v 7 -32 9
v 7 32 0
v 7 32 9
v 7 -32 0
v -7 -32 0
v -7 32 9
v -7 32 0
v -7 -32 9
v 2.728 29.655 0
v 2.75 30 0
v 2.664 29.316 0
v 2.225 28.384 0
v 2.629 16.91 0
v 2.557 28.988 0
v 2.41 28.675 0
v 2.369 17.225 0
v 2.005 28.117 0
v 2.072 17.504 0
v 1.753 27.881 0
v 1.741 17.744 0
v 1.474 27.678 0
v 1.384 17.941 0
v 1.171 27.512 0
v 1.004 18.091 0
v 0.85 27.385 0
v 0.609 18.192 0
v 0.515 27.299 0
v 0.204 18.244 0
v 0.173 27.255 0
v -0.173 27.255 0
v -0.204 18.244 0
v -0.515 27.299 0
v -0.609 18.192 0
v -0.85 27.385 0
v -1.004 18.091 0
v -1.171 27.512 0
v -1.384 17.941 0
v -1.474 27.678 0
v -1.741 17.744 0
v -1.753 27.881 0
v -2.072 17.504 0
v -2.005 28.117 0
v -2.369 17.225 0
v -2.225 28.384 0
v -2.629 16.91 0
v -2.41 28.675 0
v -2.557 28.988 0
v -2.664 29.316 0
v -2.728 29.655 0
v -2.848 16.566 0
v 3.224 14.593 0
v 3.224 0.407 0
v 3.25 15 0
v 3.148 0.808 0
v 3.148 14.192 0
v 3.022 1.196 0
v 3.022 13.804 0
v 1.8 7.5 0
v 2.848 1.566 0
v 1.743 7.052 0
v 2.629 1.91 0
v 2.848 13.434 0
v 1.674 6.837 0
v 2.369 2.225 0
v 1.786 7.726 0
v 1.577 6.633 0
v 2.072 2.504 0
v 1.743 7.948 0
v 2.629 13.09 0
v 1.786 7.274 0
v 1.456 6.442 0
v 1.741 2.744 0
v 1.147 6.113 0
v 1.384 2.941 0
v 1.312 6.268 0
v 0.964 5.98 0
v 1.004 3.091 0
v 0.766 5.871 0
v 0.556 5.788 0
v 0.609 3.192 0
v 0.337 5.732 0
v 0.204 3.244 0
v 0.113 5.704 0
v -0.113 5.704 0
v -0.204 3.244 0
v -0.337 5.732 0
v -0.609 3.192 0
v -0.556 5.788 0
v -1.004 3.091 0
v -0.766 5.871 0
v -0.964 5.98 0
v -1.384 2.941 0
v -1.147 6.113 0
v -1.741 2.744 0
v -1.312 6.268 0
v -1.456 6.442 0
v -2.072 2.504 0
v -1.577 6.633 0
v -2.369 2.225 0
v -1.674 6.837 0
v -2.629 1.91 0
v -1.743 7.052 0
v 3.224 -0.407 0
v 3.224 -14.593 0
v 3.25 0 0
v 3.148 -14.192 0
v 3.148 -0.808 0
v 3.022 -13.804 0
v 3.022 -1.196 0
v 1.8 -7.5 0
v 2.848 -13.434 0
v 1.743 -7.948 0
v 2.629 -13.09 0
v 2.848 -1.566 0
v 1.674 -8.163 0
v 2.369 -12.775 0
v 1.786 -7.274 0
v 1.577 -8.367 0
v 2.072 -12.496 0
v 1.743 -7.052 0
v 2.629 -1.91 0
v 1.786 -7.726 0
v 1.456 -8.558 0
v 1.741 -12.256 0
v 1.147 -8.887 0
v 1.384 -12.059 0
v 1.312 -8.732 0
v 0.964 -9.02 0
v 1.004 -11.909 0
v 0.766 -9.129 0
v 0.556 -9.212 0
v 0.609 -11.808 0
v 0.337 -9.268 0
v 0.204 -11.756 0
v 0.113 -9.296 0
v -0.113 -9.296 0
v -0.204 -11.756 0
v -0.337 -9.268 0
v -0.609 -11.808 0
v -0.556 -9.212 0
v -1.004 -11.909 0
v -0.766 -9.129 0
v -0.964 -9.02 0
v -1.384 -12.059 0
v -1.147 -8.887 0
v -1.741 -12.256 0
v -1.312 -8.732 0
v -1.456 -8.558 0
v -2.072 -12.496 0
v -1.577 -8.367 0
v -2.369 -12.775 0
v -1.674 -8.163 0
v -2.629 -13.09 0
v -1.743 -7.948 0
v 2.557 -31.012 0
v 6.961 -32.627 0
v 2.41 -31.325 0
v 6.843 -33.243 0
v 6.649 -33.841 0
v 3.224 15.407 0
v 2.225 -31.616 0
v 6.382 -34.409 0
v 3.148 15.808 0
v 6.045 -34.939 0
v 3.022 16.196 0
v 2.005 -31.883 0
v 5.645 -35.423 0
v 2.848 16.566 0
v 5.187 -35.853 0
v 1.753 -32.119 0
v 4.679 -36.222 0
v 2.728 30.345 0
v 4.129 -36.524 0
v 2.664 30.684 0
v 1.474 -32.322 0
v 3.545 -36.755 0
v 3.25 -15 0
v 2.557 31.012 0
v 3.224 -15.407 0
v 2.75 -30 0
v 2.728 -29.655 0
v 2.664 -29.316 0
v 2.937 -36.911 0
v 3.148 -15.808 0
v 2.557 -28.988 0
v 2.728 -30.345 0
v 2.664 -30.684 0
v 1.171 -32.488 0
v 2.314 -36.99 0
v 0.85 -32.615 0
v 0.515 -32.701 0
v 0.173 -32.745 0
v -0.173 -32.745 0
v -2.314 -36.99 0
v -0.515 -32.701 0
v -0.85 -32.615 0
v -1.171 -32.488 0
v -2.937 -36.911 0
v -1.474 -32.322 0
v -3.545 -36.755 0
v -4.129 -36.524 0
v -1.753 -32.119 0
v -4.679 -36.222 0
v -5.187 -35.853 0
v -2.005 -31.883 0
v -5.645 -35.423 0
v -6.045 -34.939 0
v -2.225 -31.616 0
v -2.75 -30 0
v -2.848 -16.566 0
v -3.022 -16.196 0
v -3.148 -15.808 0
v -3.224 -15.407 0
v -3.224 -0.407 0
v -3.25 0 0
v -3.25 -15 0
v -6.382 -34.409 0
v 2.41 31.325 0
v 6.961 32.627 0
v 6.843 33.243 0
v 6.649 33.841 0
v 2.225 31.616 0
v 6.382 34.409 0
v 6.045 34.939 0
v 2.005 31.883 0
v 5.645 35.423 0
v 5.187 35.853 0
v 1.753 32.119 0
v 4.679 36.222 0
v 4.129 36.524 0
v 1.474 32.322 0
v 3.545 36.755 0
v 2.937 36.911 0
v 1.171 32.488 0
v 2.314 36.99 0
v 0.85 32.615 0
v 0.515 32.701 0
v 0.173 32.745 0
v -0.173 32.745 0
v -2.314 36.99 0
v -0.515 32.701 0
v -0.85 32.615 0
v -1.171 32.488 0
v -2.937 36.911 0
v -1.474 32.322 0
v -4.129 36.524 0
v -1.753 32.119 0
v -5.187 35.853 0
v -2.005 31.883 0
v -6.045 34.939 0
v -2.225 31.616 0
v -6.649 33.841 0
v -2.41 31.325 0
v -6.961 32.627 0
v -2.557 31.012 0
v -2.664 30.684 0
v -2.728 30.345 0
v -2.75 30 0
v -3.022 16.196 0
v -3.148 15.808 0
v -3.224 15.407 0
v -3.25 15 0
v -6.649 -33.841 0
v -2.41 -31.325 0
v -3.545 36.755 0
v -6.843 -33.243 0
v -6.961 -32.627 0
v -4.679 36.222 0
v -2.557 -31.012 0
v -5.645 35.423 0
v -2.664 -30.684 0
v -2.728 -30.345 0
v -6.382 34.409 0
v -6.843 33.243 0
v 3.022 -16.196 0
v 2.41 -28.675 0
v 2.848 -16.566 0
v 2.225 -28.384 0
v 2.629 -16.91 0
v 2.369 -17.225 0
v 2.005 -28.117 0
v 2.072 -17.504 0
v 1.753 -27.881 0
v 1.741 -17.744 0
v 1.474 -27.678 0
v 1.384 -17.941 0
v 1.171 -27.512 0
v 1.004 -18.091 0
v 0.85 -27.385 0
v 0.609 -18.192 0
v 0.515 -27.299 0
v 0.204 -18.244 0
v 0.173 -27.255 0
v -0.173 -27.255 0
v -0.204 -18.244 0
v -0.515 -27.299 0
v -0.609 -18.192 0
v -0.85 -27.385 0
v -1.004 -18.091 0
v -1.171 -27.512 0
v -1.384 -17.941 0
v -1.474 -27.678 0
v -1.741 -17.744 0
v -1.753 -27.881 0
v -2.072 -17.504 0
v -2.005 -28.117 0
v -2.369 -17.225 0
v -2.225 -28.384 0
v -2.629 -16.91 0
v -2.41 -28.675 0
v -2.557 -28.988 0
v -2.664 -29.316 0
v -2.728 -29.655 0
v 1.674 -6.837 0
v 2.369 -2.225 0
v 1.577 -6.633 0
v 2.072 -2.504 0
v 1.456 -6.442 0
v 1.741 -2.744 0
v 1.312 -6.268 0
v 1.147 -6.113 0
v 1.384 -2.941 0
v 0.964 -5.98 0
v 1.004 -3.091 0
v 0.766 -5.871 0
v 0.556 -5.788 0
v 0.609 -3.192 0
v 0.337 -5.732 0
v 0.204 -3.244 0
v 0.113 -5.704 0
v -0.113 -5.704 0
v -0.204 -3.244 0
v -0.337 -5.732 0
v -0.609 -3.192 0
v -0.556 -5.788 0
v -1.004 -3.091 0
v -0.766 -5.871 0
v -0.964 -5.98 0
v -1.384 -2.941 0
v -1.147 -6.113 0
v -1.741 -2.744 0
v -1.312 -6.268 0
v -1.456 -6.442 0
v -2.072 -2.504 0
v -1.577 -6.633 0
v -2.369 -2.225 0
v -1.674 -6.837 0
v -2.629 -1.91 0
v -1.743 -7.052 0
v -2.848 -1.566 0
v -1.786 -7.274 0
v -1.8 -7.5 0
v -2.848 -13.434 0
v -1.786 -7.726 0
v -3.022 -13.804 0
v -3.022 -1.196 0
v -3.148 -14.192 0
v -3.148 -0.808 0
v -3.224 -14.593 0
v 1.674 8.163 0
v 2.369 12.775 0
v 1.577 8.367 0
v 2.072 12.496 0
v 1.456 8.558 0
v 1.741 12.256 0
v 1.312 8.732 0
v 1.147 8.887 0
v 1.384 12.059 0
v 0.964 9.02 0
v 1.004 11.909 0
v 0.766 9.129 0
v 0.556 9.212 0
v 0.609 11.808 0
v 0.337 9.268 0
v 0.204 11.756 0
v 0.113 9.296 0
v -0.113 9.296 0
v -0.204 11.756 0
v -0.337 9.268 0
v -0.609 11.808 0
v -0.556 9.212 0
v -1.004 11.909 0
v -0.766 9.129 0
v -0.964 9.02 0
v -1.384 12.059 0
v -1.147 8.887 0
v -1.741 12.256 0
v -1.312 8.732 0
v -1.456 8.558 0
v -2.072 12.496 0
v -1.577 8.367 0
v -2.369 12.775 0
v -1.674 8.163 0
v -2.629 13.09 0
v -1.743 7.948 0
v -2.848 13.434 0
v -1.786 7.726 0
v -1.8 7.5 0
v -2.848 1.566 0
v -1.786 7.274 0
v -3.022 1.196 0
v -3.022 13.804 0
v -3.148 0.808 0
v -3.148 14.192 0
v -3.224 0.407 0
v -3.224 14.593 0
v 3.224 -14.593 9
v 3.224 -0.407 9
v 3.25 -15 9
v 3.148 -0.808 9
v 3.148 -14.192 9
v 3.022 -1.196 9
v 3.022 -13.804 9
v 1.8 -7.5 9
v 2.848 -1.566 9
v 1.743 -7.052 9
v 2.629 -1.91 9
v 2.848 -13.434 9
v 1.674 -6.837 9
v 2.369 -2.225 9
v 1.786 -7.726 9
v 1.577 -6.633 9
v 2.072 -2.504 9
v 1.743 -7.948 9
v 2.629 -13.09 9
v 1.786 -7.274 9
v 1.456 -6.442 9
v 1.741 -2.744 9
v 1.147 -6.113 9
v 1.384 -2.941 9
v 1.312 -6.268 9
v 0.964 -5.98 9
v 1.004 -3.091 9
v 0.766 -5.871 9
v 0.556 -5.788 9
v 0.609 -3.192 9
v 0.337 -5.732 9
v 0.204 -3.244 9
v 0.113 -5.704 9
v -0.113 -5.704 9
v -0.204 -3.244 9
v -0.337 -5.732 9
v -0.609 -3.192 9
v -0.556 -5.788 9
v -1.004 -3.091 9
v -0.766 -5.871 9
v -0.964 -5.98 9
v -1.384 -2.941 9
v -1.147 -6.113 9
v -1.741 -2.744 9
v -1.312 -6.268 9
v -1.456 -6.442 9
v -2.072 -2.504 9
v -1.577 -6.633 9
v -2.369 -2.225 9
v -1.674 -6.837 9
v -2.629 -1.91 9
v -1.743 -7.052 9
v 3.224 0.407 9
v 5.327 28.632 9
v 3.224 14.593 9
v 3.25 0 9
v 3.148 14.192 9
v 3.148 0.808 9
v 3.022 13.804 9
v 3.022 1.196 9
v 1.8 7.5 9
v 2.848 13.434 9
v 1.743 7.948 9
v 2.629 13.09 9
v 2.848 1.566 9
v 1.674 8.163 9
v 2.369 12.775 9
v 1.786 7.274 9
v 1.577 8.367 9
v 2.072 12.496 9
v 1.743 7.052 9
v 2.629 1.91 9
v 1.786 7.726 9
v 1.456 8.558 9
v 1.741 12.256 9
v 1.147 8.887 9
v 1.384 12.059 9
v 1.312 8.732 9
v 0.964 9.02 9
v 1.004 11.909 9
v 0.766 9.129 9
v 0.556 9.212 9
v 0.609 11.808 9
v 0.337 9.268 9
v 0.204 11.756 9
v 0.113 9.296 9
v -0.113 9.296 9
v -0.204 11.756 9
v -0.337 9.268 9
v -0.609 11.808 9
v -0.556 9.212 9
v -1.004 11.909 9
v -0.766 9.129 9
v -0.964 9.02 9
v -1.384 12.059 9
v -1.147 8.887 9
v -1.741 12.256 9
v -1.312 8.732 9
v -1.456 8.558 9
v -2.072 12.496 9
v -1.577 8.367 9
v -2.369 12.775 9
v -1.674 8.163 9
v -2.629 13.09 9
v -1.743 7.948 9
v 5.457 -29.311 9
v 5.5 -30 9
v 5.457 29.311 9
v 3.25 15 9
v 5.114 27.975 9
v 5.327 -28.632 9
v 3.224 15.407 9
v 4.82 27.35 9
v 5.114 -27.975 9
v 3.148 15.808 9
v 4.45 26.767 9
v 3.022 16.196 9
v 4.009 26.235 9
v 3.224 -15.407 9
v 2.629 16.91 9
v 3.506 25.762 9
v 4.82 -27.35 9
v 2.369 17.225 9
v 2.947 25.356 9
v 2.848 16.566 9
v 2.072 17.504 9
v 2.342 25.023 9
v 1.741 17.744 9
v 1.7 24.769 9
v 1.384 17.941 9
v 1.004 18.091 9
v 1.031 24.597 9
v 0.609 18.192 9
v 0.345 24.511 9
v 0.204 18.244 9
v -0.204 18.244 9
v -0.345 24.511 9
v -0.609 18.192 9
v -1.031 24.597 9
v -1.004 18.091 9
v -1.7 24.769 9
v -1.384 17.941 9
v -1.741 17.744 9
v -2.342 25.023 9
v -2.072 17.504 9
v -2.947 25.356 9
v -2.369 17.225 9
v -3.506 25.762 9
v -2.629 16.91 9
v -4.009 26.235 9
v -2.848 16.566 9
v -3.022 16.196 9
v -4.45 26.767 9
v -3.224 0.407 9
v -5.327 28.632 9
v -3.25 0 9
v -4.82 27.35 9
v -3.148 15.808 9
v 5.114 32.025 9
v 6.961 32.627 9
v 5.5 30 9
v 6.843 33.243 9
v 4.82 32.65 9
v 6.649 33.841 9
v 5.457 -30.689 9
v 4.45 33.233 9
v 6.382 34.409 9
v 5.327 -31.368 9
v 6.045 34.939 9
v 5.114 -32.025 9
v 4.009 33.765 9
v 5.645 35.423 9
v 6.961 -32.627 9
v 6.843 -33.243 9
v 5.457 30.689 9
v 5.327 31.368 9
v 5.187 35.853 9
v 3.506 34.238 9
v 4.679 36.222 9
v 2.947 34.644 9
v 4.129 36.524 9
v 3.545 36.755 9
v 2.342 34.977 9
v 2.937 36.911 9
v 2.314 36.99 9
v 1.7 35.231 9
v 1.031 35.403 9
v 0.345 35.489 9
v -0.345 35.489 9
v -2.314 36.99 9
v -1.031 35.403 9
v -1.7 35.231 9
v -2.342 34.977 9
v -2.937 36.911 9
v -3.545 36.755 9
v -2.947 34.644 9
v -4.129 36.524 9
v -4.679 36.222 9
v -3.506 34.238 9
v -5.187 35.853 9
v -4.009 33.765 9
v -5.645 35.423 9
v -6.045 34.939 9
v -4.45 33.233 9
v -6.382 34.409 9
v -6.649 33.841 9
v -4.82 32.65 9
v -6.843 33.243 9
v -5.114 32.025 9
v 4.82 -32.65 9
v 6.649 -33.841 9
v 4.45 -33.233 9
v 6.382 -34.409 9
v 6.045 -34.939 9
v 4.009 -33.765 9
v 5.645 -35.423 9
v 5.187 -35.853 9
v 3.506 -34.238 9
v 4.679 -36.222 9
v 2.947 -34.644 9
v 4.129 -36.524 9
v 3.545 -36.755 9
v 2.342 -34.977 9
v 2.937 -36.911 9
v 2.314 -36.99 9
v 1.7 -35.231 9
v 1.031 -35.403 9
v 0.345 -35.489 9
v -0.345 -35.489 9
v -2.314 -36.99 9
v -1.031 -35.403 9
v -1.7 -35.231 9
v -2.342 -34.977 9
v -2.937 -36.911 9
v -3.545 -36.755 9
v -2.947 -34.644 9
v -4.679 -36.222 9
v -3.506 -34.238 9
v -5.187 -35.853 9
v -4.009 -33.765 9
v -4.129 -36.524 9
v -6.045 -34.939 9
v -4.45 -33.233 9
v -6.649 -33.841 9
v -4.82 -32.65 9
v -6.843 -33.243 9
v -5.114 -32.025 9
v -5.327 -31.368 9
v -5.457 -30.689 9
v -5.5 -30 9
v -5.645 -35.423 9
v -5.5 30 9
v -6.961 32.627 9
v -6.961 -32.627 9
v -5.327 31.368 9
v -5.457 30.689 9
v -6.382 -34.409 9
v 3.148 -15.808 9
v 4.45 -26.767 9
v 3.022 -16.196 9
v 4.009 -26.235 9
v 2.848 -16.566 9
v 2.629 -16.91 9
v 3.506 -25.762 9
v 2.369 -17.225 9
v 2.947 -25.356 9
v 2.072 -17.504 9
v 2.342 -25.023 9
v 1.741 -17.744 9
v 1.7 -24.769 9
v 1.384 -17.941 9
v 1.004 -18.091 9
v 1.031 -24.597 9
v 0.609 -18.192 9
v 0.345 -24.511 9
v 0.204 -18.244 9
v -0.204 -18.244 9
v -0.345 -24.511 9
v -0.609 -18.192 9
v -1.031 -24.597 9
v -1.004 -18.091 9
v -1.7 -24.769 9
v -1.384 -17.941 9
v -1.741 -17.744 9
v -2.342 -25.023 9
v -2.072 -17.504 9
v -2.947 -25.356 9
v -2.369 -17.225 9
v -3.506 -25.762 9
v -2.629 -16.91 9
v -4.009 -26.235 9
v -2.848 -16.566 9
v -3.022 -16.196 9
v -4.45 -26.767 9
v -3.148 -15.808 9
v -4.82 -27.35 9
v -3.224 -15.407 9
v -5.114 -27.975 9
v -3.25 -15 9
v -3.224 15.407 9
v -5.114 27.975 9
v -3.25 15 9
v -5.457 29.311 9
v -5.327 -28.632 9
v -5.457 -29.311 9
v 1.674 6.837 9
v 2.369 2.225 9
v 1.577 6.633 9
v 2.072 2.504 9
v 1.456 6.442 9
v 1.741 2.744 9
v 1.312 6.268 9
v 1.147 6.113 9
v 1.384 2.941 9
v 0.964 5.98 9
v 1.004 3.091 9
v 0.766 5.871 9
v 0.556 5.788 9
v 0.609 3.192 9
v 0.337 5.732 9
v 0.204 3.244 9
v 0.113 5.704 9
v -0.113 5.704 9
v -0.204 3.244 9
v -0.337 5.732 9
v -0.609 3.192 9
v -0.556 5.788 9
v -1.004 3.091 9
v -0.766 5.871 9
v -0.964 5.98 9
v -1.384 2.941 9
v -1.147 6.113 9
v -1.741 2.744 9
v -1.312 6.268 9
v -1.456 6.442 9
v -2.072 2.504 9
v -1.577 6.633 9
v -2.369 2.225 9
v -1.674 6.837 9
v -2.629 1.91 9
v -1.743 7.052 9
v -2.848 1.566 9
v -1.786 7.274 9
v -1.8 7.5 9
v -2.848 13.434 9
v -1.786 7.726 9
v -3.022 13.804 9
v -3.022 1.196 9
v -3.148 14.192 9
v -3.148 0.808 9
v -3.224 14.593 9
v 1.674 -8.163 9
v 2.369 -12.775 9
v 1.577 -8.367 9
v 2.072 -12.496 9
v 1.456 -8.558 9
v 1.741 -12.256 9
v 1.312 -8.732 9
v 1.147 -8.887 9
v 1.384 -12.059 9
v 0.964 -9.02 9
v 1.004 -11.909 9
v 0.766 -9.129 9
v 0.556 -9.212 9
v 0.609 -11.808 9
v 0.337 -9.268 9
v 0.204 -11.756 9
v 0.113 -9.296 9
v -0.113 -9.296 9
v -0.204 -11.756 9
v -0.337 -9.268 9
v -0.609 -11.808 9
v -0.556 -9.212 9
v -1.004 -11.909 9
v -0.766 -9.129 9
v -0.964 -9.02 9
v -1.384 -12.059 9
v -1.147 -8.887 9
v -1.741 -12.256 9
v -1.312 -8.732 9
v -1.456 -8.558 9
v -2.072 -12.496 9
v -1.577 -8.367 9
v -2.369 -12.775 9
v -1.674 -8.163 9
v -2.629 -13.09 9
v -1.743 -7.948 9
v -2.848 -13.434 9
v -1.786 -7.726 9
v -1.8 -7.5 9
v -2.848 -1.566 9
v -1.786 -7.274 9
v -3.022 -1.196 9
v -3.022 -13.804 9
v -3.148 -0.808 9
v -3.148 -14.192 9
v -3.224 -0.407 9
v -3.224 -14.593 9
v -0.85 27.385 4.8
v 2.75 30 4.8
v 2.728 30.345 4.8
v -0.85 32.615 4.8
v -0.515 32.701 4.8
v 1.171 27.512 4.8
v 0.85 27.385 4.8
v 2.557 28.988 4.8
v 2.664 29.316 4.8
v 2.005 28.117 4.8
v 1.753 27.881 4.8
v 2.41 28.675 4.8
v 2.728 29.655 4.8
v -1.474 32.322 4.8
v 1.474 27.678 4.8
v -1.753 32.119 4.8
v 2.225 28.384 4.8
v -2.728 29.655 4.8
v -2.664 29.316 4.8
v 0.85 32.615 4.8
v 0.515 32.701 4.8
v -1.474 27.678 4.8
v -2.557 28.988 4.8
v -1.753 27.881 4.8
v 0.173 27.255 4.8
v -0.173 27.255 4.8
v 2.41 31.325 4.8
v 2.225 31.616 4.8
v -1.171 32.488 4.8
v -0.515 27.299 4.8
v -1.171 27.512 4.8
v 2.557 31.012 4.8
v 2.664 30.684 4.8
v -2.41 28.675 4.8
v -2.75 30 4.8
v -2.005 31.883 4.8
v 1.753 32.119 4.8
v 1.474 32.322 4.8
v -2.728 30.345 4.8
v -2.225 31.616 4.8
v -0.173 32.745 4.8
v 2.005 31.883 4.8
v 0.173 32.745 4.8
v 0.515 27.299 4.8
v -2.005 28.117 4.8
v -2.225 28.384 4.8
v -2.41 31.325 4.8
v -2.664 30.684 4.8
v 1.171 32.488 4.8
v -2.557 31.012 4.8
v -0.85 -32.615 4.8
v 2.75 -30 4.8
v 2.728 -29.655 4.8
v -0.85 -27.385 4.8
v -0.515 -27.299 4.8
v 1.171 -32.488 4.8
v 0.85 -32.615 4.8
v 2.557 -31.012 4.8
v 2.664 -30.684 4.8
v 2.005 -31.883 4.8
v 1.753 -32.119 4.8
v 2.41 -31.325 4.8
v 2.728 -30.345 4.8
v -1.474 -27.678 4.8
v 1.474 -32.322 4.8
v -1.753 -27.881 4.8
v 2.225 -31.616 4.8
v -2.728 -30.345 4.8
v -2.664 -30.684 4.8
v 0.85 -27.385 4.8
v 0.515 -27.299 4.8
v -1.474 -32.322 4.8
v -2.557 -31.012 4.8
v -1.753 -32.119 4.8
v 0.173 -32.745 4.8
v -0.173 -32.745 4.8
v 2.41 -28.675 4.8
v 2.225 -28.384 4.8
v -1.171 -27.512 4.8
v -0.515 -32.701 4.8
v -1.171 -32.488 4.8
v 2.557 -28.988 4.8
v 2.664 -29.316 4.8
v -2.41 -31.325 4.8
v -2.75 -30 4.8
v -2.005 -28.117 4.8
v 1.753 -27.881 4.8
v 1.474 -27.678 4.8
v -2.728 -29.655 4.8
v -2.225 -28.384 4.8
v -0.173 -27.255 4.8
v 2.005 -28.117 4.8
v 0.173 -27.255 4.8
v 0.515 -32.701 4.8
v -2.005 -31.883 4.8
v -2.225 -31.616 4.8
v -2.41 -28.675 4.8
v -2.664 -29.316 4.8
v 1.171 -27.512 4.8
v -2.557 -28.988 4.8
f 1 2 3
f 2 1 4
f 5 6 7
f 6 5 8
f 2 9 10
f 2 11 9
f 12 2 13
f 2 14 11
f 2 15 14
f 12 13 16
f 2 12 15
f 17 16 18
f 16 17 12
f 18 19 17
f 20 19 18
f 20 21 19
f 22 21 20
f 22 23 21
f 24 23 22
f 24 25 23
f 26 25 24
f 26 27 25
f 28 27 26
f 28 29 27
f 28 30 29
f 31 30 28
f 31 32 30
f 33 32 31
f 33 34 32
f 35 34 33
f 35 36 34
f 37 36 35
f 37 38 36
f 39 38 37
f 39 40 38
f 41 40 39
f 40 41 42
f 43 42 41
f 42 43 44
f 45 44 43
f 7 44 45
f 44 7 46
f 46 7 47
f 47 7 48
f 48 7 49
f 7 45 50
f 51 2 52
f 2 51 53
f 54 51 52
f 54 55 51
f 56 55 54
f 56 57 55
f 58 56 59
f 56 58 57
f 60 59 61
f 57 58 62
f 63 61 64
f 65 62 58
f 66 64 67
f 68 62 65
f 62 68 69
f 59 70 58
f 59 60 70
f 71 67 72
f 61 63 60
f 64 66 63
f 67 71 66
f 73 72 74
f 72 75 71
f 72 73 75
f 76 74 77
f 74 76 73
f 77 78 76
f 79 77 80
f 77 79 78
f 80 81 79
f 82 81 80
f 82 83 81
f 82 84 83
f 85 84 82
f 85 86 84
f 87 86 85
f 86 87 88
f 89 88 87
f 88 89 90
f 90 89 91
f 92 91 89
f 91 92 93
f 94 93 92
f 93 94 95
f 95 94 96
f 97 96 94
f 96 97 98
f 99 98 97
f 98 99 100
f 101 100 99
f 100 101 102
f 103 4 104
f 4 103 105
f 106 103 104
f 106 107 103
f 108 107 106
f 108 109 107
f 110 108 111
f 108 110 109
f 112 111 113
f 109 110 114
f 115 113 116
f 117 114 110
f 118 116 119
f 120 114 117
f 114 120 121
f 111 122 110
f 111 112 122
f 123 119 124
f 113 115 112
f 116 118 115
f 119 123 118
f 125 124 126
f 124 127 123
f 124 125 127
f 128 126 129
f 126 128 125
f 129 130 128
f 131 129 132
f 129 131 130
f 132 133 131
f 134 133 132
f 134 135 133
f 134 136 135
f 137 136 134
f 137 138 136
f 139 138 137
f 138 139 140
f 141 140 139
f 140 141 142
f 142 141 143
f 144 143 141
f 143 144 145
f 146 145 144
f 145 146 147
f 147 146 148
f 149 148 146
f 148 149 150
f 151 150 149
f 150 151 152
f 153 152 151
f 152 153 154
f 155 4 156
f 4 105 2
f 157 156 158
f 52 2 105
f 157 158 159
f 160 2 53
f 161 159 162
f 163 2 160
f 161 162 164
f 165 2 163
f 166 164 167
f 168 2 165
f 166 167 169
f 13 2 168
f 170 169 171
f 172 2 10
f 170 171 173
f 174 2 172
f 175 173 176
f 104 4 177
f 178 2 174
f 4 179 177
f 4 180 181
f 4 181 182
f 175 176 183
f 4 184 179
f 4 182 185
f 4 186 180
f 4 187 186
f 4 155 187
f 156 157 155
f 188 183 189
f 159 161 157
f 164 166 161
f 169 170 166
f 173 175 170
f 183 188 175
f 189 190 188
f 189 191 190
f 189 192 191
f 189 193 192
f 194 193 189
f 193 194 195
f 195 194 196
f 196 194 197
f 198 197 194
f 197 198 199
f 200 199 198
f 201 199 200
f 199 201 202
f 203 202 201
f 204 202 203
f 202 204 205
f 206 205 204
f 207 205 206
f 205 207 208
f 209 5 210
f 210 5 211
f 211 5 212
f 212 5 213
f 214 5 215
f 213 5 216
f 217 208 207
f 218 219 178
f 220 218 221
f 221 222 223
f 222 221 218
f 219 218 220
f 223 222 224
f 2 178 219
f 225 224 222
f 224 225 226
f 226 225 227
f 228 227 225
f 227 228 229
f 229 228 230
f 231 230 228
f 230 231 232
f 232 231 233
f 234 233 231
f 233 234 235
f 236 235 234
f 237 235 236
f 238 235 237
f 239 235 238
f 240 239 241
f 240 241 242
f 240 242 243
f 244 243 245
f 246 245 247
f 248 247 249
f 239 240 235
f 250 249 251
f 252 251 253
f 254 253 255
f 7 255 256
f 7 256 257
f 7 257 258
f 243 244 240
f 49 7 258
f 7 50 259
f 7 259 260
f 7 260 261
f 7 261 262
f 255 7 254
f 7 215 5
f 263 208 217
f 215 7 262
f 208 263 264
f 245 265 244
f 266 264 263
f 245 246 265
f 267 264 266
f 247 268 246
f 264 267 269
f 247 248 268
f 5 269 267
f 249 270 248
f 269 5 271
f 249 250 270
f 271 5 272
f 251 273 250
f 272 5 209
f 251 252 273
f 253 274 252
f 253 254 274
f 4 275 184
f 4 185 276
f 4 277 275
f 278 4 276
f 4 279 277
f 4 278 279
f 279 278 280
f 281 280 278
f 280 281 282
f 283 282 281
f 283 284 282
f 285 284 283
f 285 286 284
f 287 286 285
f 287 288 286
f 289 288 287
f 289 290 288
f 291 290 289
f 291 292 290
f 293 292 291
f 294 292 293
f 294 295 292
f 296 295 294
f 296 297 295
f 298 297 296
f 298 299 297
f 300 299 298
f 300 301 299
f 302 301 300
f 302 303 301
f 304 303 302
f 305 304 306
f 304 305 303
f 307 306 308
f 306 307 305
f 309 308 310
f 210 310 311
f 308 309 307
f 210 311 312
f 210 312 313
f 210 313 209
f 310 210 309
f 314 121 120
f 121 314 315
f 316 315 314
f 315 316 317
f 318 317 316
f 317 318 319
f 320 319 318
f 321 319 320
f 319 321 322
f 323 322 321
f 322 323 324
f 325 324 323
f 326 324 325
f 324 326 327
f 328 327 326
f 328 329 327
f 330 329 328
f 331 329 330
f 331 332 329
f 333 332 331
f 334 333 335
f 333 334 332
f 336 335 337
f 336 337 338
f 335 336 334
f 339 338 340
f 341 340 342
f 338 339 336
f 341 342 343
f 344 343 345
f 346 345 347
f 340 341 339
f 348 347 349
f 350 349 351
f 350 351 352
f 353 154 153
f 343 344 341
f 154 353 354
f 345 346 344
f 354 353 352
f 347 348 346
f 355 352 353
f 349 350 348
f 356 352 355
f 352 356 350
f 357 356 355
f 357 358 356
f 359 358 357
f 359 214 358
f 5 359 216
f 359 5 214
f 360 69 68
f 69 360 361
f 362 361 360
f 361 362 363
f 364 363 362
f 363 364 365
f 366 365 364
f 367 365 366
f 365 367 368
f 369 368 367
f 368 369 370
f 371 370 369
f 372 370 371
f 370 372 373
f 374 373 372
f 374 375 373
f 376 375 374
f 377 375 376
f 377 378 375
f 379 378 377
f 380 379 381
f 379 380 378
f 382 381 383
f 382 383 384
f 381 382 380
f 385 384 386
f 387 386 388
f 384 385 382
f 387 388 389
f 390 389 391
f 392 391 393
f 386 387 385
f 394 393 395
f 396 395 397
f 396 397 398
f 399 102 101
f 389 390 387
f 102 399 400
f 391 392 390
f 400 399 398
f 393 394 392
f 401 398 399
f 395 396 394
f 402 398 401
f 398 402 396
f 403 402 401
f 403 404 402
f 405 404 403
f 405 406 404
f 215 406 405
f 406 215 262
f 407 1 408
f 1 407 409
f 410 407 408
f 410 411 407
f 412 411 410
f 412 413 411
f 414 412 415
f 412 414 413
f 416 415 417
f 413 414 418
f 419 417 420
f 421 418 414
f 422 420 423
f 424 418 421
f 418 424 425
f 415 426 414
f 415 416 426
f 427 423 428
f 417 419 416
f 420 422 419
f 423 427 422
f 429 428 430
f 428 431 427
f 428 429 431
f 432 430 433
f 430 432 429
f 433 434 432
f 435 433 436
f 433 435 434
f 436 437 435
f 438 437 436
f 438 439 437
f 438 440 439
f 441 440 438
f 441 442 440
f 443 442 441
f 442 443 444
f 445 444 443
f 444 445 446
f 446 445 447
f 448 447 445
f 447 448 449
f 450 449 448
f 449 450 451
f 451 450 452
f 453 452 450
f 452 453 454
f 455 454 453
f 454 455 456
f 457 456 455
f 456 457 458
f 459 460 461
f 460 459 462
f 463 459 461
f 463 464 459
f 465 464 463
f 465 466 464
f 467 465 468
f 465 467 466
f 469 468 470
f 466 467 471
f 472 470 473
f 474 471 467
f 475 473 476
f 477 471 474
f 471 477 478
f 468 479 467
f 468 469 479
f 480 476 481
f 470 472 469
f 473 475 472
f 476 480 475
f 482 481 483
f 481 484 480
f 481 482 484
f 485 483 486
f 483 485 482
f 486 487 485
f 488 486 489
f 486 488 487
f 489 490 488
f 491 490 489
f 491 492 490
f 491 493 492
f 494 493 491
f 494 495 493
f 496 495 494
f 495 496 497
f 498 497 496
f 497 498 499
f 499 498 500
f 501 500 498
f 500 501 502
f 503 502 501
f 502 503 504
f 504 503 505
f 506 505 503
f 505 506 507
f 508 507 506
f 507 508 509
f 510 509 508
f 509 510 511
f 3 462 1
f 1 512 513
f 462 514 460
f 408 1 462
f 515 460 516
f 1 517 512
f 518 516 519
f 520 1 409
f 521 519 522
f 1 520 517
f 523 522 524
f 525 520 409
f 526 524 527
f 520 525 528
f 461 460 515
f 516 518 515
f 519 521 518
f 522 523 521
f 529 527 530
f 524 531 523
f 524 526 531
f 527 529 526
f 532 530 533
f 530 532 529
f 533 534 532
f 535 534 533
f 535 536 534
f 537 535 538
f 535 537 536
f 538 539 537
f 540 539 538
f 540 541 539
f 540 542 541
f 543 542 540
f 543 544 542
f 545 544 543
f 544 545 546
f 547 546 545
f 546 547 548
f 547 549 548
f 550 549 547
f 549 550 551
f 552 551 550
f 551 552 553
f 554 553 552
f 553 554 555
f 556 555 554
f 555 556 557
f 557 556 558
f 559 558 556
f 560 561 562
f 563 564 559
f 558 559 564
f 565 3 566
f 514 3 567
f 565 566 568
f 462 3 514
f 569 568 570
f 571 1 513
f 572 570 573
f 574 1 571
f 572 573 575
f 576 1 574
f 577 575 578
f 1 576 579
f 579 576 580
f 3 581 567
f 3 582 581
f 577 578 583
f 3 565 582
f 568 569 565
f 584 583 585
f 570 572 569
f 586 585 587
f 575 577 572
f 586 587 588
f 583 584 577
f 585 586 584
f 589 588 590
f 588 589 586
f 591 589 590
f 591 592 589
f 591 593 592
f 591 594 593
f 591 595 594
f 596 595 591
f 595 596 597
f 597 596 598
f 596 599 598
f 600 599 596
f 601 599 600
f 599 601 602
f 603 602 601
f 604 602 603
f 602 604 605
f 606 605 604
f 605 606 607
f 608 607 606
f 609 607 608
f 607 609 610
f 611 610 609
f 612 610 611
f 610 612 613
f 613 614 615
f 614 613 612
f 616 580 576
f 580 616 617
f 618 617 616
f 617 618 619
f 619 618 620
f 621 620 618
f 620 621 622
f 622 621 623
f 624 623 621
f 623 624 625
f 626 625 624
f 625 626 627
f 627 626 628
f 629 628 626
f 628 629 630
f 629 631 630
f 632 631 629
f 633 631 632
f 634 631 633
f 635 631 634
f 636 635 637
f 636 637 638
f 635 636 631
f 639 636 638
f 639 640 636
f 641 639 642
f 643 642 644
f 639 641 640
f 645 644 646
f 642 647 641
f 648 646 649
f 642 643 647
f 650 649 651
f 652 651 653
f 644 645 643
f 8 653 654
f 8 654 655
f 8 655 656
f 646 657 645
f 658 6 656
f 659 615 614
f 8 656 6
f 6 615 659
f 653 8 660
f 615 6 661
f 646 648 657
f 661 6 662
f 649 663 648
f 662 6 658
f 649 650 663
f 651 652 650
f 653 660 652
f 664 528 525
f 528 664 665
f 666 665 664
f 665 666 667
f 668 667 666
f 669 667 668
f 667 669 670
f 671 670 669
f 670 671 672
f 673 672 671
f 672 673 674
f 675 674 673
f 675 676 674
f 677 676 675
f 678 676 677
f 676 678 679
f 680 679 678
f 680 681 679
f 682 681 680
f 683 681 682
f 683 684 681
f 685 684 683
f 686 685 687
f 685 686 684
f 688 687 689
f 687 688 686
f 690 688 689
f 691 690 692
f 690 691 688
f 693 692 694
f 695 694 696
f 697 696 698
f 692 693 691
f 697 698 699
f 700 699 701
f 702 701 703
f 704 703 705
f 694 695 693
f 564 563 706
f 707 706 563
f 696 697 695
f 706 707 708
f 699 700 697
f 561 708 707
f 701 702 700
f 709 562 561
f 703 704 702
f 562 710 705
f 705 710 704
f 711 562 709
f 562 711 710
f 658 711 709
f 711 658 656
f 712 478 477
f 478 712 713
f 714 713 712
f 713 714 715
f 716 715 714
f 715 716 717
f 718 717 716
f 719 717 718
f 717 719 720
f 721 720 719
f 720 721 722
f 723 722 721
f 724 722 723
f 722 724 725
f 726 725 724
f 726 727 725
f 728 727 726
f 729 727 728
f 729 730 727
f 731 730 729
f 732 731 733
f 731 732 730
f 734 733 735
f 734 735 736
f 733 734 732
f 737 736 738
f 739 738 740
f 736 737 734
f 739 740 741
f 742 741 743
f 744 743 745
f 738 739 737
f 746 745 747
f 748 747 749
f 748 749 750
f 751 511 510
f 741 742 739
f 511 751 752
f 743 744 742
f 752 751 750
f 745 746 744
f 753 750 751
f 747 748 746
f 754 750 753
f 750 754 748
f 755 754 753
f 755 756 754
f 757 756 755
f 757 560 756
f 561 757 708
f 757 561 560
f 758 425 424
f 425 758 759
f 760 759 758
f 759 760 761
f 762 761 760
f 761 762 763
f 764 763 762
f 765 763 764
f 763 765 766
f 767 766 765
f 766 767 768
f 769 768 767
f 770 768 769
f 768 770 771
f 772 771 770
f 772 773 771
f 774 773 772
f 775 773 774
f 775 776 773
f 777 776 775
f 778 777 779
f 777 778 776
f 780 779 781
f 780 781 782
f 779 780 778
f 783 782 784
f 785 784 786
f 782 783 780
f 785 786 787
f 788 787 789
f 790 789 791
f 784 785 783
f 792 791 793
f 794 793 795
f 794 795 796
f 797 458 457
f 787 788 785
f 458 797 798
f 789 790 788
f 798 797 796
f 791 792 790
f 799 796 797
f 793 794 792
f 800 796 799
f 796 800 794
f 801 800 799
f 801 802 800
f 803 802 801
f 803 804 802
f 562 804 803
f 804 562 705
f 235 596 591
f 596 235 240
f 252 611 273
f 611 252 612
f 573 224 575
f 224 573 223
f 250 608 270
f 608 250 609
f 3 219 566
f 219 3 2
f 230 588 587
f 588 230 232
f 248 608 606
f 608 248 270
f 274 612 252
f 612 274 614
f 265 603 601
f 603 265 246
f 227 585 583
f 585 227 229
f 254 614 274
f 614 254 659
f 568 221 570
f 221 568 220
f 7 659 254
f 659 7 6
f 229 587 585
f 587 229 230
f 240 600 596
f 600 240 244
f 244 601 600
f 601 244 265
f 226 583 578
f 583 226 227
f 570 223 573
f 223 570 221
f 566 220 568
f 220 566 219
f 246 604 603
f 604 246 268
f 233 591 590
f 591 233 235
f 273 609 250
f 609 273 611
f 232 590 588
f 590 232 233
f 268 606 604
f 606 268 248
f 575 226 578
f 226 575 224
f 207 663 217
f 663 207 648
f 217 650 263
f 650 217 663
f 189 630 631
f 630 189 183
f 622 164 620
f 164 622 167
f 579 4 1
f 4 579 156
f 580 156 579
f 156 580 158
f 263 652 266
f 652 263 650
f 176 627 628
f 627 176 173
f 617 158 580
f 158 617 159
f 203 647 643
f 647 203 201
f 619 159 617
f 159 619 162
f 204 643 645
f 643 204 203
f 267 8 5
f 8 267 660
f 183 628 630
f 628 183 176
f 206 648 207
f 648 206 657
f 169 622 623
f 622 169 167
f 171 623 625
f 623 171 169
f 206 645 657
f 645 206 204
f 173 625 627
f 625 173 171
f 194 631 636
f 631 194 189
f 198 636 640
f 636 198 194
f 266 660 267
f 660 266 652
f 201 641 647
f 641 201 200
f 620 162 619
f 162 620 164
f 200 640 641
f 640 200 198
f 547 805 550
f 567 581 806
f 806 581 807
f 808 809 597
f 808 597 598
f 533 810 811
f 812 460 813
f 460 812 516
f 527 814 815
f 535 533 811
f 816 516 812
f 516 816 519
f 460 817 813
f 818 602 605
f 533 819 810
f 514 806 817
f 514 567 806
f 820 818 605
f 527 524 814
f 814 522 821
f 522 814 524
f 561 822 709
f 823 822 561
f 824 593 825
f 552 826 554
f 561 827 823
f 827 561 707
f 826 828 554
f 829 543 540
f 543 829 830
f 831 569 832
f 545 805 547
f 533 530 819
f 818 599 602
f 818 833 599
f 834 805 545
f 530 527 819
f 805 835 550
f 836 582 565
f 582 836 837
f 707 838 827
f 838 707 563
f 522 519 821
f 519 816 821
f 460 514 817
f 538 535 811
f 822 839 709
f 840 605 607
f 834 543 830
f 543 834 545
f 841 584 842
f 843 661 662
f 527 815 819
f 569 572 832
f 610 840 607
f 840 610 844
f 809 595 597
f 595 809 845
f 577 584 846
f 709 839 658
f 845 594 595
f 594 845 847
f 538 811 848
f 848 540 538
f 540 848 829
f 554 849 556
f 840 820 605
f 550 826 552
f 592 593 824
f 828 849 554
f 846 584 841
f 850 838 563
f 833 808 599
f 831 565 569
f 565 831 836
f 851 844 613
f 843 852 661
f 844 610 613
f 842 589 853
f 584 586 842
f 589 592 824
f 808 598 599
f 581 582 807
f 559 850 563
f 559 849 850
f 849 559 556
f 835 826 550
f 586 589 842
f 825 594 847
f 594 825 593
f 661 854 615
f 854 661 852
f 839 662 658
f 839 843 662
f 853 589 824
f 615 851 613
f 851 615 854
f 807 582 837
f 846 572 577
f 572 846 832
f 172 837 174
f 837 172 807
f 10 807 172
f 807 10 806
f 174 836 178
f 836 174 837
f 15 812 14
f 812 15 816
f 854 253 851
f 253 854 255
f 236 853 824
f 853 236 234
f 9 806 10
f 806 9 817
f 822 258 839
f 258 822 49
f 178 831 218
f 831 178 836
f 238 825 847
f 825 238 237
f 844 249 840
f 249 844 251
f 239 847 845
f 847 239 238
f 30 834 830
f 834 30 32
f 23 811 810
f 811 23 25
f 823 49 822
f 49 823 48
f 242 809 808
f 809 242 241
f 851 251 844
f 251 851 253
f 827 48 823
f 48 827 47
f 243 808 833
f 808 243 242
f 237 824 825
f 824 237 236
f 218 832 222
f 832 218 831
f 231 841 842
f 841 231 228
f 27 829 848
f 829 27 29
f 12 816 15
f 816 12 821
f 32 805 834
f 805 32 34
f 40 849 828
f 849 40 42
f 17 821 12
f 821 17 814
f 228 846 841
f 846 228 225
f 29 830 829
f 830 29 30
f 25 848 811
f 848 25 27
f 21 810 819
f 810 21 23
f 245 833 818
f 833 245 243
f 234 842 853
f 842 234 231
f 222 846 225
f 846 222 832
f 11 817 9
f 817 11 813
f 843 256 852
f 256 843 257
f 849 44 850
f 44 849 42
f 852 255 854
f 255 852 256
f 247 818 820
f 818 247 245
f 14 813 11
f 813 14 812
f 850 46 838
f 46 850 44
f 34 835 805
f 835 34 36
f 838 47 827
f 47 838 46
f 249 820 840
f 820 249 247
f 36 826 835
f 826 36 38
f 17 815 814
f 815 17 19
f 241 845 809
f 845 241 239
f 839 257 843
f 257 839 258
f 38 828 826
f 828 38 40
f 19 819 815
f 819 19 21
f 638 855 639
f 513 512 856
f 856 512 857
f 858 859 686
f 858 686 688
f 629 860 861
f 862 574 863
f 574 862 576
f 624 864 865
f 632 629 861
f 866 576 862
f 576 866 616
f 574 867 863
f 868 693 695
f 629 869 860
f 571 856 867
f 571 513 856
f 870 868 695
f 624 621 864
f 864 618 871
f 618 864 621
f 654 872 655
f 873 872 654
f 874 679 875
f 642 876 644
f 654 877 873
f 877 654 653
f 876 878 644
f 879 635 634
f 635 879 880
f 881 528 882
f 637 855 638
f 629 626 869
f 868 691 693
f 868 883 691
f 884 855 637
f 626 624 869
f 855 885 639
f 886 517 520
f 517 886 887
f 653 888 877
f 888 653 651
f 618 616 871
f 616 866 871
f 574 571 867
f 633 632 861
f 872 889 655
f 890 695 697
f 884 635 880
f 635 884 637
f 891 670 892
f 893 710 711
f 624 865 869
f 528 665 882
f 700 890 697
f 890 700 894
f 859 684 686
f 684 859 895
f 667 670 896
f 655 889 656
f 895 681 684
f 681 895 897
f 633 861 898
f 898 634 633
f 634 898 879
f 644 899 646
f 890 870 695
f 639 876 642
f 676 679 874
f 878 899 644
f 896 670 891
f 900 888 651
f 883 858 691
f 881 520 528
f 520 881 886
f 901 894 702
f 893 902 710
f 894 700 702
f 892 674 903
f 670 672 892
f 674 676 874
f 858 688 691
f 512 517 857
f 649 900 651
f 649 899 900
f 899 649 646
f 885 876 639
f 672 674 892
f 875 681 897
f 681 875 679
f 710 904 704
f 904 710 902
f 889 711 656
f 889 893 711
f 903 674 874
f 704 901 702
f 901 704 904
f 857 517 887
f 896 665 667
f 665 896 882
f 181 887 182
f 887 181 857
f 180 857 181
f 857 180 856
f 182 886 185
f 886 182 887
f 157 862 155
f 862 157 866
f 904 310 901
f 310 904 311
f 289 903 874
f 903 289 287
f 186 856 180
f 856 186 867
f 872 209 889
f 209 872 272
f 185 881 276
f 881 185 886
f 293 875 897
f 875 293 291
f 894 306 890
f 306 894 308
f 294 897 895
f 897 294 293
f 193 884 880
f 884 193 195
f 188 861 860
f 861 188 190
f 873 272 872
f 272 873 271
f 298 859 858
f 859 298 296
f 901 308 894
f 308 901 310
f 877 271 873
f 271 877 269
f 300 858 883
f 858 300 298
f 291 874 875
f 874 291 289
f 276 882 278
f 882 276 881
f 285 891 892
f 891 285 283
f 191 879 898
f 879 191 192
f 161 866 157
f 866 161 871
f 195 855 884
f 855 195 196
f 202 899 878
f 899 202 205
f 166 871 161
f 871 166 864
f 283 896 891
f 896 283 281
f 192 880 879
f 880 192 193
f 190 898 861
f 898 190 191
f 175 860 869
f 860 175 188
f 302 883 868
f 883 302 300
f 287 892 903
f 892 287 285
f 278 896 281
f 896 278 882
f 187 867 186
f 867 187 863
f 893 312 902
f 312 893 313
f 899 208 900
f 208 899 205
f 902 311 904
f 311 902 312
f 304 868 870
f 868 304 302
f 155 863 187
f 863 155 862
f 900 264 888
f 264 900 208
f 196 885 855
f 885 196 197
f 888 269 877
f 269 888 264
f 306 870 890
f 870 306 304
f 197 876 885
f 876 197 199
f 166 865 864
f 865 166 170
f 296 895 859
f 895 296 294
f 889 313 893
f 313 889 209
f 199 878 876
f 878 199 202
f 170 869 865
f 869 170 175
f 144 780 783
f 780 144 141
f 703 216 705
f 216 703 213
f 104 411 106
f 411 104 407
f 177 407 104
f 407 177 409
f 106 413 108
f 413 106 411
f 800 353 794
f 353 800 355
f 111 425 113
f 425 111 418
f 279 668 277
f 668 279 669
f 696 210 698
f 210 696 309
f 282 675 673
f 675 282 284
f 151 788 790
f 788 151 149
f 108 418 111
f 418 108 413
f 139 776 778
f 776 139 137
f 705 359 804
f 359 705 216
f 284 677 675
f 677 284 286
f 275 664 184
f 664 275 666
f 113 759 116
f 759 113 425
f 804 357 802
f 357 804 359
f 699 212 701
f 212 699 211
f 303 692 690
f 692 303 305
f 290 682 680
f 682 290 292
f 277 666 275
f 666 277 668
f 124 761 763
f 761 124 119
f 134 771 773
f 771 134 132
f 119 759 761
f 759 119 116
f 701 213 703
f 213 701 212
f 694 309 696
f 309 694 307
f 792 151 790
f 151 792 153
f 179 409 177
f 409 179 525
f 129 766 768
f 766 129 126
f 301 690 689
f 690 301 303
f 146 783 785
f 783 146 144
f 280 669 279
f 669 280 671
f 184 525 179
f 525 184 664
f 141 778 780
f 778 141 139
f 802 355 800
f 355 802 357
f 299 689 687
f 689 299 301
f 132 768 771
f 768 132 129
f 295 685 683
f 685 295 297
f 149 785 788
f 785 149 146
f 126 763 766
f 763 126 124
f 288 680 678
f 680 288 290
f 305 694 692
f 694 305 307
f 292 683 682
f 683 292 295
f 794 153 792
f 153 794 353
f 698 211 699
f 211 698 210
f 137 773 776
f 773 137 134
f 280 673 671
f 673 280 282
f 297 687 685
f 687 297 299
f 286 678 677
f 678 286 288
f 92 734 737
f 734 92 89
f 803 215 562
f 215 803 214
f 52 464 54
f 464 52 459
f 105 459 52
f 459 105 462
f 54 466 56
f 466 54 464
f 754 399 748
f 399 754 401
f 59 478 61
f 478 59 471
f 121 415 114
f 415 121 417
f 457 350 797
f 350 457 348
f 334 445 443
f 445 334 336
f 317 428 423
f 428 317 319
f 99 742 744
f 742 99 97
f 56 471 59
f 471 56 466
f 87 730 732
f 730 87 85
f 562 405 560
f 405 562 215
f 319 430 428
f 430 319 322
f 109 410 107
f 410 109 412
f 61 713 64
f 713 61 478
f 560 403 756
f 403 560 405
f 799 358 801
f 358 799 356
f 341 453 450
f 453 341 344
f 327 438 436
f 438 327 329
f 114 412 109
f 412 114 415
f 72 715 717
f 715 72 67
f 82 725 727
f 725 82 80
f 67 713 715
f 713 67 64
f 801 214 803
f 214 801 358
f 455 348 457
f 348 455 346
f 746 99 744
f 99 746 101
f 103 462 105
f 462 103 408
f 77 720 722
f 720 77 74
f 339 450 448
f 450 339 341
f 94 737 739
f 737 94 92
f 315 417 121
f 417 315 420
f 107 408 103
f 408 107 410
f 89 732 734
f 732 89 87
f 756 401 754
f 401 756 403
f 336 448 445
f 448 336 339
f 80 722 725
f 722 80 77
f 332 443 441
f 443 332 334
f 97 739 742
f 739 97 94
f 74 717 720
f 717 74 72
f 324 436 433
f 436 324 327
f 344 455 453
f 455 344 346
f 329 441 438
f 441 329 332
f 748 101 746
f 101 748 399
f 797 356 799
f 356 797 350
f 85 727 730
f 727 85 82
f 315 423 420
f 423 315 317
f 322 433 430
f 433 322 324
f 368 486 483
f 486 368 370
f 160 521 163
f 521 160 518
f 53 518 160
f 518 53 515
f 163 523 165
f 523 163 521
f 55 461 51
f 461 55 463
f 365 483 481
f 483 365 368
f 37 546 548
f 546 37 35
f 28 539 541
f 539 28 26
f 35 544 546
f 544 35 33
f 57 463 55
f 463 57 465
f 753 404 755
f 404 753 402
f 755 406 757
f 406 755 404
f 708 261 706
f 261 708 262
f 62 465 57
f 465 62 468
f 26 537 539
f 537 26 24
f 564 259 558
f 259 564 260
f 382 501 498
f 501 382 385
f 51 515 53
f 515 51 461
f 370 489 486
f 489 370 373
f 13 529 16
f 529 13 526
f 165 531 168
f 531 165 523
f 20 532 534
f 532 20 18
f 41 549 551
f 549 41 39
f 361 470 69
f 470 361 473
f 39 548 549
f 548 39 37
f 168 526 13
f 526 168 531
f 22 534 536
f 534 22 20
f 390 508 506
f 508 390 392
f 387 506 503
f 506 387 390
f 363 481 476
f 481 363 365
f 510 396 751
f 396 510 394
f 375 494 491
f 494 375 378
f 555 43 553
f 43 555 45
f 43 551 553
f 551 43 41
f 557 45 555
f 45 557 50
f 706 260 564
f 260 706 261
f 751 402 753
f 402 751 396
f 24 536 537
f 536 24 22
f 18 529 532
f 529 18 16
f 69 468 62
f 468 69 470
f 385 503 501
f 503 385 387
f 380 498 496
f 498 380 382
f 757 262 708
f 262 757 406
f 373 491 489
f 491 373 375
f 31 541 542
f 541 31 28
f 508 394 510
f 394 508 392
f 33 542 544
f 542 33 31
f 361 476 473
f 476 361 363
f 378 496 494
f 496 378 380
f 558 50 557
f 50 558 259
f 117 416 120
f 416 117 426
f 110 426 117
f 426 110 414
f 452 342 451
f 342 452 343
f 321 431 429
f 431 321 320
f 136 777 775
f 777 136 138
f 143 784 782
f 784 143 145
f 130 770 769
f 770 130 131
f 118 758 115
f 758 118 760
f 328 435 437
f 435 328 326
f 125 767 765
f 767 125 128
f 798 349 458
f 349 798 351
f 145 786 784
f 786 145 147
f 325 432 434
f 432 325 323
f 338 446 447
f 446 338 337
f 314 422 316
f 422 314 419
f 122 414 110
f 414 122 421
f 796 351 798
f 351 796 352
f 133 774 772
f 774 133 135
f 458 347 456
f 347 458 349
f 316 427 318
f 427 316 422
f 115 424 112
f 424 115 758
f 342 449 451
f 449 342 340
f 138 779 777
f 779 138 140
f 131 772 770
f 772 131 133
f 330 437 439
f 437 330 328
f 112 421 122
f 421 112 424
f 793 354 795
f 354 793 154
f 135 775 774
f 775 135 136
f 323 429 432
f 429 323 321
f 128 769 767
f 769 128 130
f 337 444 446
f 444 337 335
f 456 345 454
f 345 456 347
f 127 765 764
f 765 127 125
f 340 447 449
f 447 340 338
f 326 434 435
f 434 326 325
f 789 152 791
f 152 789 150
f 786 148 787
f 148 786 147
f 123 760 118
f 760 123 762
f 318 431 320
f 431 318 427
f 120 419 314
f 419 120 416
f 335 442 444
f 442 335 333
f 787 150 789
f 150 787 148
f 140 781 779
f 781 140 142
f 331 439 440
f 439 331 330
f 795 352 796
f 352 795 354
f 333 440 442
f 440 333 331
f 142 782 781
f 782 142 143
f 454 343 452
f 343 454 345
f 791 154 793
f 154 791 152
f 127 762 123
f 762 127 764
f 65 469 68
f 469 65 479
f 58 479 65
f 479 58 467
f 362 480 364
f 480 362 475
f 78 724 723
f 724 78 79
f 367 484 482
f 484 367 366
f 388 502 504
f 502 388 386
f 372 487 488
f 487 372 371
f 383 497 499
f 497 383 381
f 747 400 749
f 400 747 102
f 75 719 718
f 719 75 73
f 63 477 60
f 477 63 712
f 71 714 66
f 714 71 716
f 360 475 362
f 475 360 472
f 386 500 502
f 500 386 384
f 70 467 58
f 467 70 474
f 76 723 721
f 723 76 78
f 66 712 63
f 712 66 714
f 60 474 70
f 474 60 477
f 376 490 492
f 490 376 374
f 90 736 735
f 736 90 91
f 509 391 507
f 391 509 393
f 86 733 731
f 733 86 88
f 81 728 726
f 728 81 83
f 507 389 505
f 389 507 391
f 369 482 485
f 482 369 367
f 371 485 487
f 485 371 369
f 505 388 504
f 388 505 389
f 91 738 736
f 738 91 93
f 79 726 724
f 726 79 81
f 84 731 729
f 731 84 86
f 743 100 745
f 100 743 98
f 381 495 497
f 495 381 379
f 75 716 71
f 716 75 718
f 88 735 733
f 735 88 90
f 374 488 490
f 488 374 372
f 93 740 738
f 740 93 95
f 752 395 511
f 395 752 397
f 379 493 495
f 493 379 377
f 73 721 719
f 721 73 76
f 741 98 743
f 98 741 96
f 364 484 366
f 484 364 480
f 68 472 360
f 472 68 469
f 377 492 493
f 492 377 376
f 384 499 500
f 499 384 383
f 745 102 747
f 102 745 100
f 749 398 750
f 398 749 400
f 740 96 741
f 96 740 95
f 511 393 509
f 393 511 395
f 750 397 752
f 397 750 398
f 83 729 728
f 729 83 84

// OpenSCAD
$fn = 50;


difference() {
	union() {
		hull() {
			translate(v = [-2.0000000000, 17.0000000000, 0]) {
				cylinder(h = 9, r = 5);
			}
			translate(v = [2.0000000000, 17.0000000000, 0]) {
				cylinder(h = 9, r = 5);
			}
			translate(v = [-2.0000000000, -17.0000000000, 0]) {
				cylinder(h = 9, r = 5);
			}
			translate(v = [2.0000000000, -17.0000000000, 0]) {
				cylinder(h = 9, r = 5);
			}
		}
		translate(v = [0.0000000000, 22.5000000000, 0]) {
			hull() {
				translate(v = [-2.0000000000, 9.5000000000, 0]) {
					cylinder(h = 9, r = 5);
				}
				translate(v = [2.0000000000, 9.5000000000, 0]) {
					cylinder(h = 9, r = 5);
				}
				translate(v = [-2.0000000000, -9.5000000000, 0]) {
					cylinder(h = 9, r = 5);
				}
				translate(v = [2.0000000000, -9.5000000000, 0]) {
					cylinder(h = 9, r = 5);
				}
			}
		}
		translate(v = [0.0000000000, 22.5000000000, 0]) {
			hull() {
				translate(v = [-2.0000000000, 9.5000000000, 0]) {
					cylinder(h = 9, r = 5);
				}
				translate(v = [2.0000000000, 9.5000000000, 0]) {
					cylinder(h = 9, r = 5);
				}
				translate(v = [-2.0000000000, -9.5000000000, 0]) {
					cylinder(h = 9, r = 5);
				}
				translate(v = [2.0000000000, -9.5000000000, 0]) {
					cylinder(h = 9, r = 5);
				}
			}
		}
		translate(v = [0.0000000000, -22.5000000000, 0]) {
			hull() {
				translate(v = [-2.0000000000, 9.5000000000, 0]) {
					cylinder(h = 9, r = 5);
				}
				translate(v = [2.0000000000, 9.5000000000, 0]) {
					cylinder(h = 9, r = 5);
				}
				translate(v = [-2.0000000000, -9.5000000000, 0]) {
					cylinder(h = 9, r = 5);
				}
				translate(v = [2.0000000000, -9.5000000000, 0]) {
					cylinder(h = 9, r = 5);
				}
			}
		}
		translate(v = [0.0000000000, -22.5000000000, 0]) {
			hull() {
				translate(v = [-2.0000000000, 9.5000000000, 0]) {
					cylinder(h = 9, r = 5);
				}
				translate(v = [2.0000000000, 9.5000000000, 0]) {
					cylinder(h = 9, r = 5);
				}
				translate(v = [-2.0000000000, -9.5000000000, 0]) {
					cylinder(h = 9, r = 5);
				}
				translate(v = [2.0000000000, -9.5000000000, 0]) {
					cylinder(h = 9, r = 5);
				}
			}
		}
	}
	union() {
		translate(v = [0.0000000000, 30.0000000000, 9]) {
			rotate(a = [0, 0, 0]) {
				difference() {
					union() {
						#translate(v = [0, 0, -9.0000000000]) {
							cylinder(h = 9, r = 2.2500000000);
						}
						#translate(v = [0, 0, -4.2000000000]) {
							cylinder(h = 4.2000000000, r1 = 2.7500000000, r2 = 5.5000000000);
						}
						#translate(v = [0, 0, -9.0000000000]) {
							cylinder(h = 9, r = 2.7500000000);
						}
						#translate(v = [0, 0, -9.0000000000]) {
							cylinder(h = 9, r = 2.2500000000);
						}
					}
					union();
				}
			}
		}
		translate(v = [0.0000000000, 30.0000000000, 9]) {
			rotate(a = [0, 0, 0]) {
				difference() {
					union() {
						#translate(v = [0, 0, -9.0000000000]) {
							cylinder(h = 9, r = 2.2500000000);
						}
						#translate(v = [0, 0, -4.2000000000]) {
							cylinder(h = 4.2000000000, r1 = 2.7500000000, r2 = 5.5000000000);
						}
						#translate(v = [0, 0, -9.0000000000]) {
							cylinder(h = 9, r = 2.7500000000);
						}
						#translate(v = [0, 0, -9.0000000000]) {
							cylinder(h = 9, r = 2.2500000000);
						}
					}
					union();
				}
			}
		}
		translate(v = [0.0000000000, -30.0000000000, 9]) {
			rotate(a = [0, 0, 0]) {
				difference() {
					union() {
						#translate(v = [0, 0, -9.0000000000]) {
							cylinder(h = 9, r = 2.2500000000);
						}
						#translate(v = [0, 0, -4.2000000000]) {
							cylinder(h = 4.2000000000, r1 = 2.7500000000, r2 = 5.5000000000);
						}
						#translate(v = [0, 0, -9.0000000000]) {
							cylinder(h = 9, r = 2.7500000000);
						}
						#translate(v = [0, 0, -9.0000000000]) {
							cylinder(h = 9, r = 2.2500000000);
						}
					}
					union();
				}
			}
		}
		translate(v = [0.0000000000, -30.0000000000, 9]) {
			rotate(a = [0, 0, 0]) {
				difference() {
					union() {
						#translate(v = [0, 0, -9.0000000000]) {
							cylinder(h = 9, r = 2.2500000000);
						}
						#translate(v = [0, 0, -4.2000000000]) {
							cylinder(h = 4.2000000000, r1 = 2.7500000000, r2 = 5.5000000000);
						}
						#translate(v = [0, 0, -9.0000000000]) {
							cylinder(h = 9, r = 2.7500000000);
						}
						#translate(v = [0, 0, -9.0000000000]) {
							cylinder(h = 9, r = 2.2500000000);
						}
					}
					union();
				}
			}
		}
		translate(v = [0.0000000000, -15.0000000000, 0]) {
			translate(v = [0, 0, -100]) {
				cylinder(h = 200, r = 3.2500000000);
			}
		}
		translate(v = [0, 0, -100]) {
			cylinder(h = 200, r = 3.2500000000);
		}
		translate(v = [0.0000000000, 15.0000000000, 0]) {
			translate(v = [0, 0, -100]) {
				cylinder(h = 200, r = 3.2500000000);
			}
		}
		translate(v = [0.0000000000, -15.0000000000, 0]) {
			translate(v = [0, 0, -100]) {
				cylinder(h = 200, r = 1.8000000000);
			}
		}
		translate(v = [0.0000000000, -7.5000000000, 0]) {
			translate(v = [0, 0, -100]) {
				cylinder(h = 200, r = 1.8000000000);
			}
		}
		translate(v = [0, 0, -100]) {
			cylinder(h = 200, r = 1.8000000000);
		}
		translate(v = [0.0000000000, 7.5000000000, 0]) {
			translate(v = [0, 0, -100]) {
				cylinder(h = 200, r = 1.8000000000);
			}
		}
		translate(v = [0.0000000000, 15.0000000000, 0]) {
			translate(v = [0, 0, -100]) {
				cylinder(h = 200, r = 1.8000000000);
			}
		}
	}
}
